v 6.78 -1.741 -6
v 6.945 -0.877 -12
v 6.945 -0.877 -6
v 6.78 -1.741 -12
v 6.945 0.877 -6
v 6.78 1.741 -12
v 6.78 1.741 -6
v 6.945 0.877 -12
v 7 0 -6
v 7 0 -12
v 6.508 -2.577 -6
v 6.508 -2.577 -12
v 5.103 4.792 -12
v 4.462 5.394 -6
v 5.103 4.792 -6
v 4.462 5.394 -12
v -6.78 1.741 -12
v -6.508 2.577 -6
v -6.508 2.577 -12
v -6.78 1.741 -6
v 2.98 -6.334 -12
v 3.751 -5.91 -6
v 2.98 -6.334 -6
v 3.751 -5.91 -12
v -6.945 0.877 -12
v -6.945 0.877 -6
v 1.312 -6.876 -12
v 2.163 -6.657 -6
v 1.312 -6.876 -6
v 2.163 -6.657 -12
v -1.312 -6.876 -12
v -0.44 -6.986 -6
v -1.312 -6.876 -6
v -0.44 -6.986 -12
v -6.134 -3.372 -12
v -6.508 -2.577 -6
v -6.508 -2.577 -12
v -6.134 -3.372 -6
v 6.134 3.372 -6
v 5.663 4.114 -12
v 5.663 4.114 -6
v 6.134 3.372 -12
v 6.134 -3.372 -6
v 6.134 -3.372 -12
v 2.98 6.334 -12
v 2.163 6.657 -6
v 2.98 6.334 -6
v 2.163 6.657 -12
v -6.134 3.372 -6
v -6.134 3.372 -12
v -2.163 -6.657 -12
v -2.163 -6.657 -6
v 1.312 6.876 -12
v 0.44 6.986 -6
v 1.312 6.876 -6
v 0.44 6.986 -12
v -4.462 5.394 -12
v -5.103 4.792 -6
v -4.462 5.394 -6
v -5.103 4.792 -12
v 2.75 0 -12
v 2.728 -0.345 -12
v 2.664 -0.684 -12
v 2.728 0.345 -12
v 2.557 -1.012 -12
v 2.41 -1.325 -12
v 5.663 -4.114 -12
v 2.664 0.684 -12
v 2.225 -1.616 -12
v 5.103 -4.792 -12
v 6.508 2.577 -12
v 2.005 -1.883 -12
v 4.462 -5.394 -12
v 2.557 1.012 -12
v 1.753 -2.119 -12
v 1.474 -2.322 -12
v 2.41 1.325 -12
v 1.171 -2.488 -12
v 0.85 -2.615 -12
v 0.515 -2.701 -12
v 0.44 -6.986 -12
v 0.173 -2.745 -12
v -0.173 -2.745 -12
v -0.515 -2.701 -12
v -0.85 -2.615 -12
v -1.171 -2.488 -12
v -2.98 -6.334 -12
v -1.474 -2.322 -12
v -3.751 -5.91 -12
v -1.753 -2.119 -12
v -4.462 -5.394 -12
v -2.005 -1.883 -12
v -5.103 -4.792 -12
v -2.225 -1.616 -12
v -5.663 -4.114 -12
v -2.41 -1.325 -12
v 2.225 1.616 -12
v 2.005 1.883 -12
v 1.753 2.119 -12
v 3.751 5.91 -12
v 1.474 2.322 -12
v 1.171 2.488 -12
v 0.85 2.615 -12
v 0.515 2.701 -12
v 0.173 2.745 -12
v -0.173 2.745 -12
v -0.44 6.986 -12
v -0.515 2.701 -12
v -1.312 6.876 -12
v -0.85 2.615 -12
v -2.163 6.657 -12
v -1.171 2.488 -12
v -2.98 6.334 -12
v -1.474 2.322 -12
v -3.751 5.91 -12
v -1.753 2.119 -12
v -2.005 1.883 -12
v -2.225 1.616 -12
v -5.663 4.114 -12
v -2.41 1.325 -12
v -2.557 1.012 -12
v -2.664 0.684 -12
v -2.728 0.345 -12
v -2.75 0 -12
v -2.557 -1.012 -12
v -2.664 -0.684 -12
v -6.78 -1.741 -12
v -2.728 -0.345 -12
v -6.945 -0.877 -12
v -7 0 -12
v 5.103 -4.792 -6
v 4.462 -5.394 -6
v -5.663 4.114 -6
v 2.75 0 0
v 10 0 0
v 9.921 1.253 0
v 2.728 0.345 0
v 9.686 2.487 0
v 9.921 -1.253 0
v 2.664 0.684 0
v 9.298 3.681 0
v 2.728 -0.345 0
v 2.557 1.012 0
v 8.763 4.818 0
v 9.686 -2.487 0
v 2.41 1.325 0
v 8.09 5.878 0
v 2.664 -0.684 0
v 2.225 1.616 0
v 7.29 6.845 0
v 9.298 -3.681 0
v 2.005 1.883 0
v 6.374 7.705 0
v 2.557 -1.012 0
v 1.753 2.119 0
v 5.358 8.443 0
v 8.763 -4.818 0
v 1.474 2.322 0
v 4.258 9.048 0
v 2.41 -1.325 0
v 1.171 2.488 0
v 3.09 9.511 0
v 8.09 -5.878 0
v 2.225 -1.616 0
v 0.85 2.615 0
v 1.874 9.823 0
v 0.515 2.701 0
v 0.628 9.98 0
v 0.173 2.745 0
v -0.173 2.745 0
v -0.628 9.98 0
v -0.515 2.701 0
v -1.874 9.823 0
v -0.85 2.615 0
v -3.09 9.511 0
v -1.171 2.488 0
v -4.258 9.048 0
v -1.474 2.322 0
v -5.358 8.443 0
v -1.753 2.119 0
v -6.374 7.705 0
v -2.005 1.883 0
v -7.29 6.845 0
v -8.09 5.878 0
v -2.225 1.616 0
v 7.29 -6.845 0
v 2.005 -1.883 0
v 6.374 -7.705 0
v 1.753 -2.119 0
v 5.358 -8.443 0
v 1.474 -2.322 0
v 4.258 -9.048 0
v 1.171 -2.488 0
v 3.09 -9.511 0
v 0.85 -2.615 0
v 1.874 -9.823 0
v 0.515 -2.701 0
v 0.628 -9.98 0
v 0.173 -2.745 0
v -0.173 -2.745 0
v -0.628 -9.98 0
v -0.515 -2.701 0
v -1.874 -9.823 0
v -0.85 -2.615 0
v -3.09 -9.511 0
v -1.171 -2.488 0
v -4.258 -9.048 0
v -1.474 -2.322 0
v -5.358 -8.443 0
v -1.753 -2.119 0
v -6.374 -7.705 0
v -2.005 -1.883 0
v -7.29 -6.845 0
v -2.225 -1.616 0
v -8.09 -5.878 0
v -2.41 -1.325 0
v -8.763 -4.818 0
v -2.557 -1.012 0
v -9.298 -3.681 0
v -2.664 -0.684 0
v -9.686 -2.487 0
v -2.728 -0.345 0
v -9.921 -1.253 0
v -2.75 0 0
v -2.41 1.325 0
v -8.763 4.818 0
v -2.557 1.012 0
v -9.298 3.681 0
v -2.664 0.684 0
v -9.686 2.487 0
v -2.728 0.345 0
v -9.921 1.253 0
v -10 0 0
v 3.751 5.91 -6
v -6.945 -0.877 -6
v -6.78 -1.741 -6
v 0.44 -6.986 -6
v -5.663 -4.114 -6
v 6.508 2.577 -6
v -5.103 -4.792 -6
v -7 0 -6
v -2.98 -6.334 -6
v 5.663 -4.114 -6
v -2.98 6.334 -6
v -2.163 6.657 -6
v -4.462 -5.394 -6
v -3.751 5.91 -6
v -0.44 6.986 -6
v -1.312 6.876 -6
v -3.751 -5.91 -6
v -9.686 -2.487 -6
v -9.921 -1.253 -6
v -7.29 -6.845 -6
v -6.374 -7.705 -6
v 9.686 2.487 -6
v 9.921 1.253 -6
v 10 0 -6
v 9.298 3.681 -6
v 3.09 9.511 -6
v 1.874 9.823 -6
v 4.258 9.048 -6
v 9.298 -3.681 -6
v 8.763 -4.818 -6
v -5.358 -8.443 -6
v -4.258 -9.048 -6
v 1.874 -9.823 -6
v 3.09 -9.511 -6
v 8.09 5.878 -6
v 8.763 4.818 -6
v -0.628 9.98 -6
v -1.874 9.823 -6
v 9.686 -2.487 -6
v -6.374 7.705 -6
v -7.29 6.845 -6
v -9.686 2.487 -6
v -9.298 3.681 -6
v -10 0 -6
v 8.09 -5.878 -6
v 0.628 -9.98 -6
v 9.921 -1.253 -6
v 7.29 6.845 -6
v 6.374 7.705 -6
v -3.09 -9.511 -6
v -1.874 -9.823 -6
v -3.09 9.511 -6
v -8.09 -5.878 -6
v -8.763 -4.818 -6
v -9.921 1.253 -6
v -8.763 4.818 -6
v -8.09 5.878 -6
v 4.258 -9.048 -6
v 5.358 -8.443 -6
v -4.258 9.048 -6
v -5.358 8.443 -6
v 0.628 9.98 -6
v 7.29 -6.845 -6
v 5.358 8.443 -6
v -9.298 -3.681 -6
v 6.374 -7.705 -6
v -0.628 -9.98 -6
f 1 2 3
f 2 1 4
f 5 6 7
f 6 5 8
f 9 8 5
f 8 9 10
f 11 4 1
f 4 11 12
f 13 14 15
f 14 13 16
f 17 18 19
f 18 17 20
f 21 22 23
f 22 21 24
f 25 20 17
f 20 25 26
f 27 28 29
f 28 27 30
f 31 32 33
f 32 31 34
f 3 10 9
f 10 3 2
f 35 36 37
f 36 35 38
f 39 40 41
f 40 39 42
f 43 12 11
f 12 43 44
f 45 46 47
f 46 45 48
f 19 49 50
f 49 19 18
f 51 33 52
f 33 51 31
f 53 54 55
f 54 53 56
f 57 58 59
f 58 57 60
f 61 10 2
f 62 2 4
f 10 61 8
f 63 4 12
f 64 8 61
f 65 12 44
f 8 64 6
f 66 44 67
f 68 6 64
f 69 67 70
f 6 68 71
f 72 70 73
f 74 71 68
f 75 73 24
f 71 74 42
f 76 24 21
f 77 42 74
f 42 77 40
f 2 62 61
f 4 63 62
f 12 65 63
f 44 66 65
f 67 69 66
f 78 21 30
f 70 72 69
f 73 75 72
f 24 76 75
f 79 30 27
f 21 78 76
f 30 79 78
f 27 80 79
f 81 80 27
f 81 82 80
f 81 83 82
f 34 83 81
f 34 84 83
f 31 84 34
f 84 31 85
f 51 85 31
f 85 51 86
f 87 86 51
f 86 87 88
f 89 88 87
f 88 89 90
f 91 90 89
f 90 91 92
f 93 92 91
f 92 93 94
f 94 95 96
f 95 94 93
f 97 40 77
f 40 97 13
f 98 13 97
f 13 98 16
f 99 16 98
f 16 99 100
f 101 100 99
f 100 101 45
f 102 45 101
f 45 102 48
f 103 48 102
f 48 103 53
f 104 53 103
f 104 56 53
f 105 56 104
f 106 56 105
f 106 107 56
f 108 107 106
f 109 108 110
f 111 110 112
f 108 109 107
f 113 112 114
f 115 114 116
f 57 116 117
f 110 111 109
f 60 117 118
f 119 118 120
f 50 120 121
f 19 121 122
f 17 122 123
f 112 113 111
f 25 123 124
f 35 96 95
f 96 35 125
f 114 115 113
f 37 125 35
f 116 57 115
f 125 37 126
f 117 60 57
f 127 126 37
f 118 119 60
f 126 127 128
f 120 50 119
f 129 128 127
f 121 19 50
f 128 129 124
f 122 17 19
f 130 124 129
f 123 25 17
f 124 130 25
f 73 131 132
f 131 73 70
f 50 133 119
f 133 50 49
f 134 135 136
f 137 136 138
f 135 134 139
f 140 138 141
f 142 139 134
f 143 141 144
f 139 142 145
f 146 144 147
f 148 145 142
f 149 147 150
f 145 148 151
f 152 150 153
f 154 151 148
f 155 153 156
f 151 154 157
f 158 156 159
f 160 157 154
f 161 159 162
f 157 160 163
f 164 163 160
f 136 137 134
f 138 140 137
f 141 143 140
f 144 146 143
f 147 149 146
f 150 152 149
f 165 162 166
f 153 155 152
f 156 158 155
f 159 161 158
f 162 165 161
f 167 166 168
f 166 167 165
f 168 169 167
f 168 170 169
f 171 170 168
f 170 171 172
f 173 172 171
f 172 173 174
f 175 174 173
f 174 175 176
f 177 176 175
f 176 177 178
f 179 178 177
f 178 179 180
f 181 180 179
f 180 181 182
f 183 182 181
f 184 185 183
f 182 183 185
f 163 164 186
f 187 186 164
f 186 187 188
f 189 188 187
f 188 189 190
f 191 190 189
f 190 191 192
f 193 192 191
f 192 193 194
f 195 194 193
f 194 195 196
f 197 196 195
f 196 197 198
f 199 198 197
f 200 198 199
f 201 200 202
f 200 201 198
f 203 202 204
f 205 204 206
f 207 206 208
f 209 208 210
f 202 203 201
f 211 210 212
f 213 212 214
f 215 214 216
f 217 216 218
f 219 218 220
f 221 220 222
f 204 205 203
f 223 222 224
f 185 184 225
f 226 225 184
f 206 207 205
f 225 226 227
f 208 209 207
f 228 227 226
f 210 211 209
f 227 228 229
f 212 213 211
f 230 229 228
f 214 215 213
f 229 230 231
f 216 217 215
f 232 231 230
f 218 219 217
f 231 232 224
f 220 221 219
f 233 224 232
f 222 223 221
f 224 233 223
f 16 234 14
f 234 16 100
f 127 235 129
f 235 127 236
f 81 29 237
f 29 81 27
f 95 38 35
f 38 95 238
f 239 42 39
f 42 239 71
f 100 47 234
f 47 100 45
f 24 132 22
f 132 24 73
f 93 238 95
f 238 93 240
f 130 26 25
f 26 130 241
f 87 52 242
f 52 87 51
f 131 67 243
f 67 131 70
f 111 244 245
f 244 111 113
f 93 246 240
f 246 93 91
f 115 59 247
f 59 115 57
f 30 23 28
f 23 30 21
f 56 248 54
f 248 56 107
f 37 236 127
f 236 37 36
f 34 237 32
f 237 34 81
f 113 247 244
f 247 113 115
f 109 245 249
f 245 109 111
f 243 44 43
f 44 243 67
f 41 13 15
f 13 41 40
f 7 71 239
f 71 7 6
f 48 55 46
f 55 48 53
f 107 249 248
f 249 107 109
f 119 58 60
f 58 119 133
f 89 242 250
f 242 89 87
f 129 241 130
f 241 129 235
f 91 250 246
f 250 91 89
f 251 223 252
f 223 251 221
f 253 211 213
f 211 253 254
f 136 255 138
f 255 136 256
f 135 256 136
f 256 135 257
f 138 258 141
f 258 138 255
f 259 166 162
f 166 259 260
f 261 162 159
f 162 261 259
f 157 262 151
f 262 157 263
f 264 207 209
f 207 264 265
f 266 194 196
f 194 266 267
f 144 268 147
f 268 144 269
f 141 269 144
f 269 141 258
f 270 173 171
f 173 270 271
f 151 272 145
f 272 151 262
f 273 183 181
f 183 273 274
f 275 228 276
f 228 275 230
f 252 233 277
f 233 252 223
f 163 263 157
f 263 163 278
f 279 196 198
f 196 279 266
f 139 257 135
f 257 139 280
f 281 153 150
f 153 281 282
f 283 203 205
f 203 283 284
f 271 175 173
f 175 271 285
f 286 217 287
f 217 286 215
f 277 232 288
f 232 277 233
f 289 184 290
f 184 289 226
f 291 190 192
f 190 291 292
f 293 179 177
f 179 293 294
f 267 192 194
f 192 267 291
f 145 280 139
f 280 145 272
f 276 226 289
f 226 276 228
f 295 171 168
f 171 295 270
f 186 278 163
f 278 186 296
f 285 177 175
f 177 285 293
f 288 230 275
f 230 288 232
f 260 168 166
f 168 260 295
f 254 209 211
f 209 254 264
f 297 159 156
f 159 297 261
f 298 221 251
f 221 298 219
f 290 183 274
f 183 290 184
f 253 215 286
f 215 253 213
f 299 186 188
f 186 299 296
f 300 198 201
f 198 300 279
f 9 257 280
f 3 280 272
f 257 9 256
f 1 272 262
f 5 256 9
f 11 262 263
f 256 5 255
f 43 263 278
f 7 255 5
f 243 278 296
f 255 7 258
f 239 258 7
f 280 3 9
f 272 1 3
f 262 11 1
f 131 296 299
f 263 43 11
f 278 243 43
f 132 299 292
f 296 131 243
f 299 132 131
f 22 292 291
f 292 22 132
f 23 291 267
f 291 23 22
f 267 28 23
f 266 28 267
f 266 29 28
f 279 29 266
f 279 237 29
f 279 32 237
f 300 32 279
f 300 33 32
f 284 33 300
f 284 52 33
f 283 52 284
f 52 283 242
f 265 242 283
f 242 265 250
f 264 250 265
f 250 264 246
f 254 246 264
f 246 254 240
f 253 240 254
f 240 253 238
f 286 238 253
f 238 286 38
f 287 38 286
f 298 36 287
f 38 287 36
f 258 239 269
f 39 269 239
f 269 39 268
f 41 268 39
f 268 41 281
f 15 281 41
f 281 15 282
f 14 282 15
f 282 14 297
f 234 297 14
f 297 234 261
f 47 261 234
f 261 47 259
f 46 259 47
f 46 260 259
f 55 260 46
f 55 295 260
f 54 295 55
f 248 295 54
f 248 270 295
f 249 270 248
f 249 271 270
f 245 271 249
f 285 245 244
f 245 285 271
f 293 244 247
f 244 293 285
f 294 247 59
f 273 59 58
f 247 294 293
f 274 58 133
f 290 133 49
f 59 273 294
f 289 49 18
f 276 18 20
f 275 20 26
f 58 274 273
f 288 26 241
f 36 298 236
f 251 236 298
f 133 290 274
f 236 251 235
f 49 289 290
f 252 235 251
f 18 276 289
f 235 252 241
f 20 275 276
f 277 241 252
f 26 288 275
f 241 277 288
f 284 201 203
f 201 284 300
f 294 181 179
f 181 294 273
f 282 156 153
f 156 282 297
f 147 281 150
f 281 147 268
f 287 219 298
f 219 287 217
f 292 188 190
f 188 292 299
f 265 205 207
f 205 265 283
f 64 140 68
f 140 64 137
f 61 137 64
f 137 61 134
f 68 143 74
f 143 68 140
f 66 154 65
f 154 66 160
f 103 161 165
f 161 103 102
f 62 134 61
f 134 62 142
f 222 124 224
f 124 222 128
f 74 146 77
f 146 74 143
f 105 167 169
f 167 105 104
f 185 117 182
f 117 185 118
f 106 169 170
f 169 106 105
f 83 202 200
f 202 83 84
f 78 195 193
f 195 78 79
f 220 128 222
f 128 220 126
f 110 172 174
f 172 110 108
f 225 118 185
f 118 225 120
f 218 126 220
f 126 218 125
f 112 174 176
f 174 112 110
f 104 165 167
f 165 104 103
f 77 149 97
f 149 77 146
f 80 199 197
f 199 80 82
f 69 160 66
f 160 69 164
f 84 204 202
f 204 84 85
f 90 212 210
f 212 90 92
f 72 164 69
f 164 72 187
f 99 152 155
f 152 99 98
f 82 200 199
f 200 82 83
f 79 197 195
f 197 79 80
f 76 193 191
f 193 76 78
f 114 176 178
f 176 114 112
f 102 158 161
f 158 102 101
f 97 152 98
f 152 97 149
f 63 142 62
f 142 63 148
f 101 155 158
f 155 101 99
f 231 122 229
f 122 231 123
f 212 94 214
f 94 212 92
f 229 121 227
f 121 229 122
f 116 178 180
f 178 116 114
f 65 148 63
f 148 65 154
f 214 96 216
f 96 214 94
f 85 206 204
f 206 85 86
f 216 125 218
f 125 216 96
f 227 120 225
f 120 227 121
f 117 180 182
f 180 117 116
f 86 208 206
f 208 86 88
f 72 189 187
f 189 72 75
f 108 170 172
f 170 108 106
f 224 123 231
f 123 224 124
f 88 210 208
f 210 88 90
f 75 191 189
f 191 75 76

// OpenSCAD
$fn = 50;


difference() {
	union() {
		translate(v = [0, 0, -12.0000000000]) {
			cylinder(h = 12, r = 7.0000000000);
		}
		translate(v = [0, 0, -6.0000000000]) {
			cylinder(h = 6, r = 10.0000000000);
		}
	}
	union() {
		#translate(v = [0, 0, -12]) {
			cylinder(h = 12, r = 2.7500000000);
		}
	}
}
